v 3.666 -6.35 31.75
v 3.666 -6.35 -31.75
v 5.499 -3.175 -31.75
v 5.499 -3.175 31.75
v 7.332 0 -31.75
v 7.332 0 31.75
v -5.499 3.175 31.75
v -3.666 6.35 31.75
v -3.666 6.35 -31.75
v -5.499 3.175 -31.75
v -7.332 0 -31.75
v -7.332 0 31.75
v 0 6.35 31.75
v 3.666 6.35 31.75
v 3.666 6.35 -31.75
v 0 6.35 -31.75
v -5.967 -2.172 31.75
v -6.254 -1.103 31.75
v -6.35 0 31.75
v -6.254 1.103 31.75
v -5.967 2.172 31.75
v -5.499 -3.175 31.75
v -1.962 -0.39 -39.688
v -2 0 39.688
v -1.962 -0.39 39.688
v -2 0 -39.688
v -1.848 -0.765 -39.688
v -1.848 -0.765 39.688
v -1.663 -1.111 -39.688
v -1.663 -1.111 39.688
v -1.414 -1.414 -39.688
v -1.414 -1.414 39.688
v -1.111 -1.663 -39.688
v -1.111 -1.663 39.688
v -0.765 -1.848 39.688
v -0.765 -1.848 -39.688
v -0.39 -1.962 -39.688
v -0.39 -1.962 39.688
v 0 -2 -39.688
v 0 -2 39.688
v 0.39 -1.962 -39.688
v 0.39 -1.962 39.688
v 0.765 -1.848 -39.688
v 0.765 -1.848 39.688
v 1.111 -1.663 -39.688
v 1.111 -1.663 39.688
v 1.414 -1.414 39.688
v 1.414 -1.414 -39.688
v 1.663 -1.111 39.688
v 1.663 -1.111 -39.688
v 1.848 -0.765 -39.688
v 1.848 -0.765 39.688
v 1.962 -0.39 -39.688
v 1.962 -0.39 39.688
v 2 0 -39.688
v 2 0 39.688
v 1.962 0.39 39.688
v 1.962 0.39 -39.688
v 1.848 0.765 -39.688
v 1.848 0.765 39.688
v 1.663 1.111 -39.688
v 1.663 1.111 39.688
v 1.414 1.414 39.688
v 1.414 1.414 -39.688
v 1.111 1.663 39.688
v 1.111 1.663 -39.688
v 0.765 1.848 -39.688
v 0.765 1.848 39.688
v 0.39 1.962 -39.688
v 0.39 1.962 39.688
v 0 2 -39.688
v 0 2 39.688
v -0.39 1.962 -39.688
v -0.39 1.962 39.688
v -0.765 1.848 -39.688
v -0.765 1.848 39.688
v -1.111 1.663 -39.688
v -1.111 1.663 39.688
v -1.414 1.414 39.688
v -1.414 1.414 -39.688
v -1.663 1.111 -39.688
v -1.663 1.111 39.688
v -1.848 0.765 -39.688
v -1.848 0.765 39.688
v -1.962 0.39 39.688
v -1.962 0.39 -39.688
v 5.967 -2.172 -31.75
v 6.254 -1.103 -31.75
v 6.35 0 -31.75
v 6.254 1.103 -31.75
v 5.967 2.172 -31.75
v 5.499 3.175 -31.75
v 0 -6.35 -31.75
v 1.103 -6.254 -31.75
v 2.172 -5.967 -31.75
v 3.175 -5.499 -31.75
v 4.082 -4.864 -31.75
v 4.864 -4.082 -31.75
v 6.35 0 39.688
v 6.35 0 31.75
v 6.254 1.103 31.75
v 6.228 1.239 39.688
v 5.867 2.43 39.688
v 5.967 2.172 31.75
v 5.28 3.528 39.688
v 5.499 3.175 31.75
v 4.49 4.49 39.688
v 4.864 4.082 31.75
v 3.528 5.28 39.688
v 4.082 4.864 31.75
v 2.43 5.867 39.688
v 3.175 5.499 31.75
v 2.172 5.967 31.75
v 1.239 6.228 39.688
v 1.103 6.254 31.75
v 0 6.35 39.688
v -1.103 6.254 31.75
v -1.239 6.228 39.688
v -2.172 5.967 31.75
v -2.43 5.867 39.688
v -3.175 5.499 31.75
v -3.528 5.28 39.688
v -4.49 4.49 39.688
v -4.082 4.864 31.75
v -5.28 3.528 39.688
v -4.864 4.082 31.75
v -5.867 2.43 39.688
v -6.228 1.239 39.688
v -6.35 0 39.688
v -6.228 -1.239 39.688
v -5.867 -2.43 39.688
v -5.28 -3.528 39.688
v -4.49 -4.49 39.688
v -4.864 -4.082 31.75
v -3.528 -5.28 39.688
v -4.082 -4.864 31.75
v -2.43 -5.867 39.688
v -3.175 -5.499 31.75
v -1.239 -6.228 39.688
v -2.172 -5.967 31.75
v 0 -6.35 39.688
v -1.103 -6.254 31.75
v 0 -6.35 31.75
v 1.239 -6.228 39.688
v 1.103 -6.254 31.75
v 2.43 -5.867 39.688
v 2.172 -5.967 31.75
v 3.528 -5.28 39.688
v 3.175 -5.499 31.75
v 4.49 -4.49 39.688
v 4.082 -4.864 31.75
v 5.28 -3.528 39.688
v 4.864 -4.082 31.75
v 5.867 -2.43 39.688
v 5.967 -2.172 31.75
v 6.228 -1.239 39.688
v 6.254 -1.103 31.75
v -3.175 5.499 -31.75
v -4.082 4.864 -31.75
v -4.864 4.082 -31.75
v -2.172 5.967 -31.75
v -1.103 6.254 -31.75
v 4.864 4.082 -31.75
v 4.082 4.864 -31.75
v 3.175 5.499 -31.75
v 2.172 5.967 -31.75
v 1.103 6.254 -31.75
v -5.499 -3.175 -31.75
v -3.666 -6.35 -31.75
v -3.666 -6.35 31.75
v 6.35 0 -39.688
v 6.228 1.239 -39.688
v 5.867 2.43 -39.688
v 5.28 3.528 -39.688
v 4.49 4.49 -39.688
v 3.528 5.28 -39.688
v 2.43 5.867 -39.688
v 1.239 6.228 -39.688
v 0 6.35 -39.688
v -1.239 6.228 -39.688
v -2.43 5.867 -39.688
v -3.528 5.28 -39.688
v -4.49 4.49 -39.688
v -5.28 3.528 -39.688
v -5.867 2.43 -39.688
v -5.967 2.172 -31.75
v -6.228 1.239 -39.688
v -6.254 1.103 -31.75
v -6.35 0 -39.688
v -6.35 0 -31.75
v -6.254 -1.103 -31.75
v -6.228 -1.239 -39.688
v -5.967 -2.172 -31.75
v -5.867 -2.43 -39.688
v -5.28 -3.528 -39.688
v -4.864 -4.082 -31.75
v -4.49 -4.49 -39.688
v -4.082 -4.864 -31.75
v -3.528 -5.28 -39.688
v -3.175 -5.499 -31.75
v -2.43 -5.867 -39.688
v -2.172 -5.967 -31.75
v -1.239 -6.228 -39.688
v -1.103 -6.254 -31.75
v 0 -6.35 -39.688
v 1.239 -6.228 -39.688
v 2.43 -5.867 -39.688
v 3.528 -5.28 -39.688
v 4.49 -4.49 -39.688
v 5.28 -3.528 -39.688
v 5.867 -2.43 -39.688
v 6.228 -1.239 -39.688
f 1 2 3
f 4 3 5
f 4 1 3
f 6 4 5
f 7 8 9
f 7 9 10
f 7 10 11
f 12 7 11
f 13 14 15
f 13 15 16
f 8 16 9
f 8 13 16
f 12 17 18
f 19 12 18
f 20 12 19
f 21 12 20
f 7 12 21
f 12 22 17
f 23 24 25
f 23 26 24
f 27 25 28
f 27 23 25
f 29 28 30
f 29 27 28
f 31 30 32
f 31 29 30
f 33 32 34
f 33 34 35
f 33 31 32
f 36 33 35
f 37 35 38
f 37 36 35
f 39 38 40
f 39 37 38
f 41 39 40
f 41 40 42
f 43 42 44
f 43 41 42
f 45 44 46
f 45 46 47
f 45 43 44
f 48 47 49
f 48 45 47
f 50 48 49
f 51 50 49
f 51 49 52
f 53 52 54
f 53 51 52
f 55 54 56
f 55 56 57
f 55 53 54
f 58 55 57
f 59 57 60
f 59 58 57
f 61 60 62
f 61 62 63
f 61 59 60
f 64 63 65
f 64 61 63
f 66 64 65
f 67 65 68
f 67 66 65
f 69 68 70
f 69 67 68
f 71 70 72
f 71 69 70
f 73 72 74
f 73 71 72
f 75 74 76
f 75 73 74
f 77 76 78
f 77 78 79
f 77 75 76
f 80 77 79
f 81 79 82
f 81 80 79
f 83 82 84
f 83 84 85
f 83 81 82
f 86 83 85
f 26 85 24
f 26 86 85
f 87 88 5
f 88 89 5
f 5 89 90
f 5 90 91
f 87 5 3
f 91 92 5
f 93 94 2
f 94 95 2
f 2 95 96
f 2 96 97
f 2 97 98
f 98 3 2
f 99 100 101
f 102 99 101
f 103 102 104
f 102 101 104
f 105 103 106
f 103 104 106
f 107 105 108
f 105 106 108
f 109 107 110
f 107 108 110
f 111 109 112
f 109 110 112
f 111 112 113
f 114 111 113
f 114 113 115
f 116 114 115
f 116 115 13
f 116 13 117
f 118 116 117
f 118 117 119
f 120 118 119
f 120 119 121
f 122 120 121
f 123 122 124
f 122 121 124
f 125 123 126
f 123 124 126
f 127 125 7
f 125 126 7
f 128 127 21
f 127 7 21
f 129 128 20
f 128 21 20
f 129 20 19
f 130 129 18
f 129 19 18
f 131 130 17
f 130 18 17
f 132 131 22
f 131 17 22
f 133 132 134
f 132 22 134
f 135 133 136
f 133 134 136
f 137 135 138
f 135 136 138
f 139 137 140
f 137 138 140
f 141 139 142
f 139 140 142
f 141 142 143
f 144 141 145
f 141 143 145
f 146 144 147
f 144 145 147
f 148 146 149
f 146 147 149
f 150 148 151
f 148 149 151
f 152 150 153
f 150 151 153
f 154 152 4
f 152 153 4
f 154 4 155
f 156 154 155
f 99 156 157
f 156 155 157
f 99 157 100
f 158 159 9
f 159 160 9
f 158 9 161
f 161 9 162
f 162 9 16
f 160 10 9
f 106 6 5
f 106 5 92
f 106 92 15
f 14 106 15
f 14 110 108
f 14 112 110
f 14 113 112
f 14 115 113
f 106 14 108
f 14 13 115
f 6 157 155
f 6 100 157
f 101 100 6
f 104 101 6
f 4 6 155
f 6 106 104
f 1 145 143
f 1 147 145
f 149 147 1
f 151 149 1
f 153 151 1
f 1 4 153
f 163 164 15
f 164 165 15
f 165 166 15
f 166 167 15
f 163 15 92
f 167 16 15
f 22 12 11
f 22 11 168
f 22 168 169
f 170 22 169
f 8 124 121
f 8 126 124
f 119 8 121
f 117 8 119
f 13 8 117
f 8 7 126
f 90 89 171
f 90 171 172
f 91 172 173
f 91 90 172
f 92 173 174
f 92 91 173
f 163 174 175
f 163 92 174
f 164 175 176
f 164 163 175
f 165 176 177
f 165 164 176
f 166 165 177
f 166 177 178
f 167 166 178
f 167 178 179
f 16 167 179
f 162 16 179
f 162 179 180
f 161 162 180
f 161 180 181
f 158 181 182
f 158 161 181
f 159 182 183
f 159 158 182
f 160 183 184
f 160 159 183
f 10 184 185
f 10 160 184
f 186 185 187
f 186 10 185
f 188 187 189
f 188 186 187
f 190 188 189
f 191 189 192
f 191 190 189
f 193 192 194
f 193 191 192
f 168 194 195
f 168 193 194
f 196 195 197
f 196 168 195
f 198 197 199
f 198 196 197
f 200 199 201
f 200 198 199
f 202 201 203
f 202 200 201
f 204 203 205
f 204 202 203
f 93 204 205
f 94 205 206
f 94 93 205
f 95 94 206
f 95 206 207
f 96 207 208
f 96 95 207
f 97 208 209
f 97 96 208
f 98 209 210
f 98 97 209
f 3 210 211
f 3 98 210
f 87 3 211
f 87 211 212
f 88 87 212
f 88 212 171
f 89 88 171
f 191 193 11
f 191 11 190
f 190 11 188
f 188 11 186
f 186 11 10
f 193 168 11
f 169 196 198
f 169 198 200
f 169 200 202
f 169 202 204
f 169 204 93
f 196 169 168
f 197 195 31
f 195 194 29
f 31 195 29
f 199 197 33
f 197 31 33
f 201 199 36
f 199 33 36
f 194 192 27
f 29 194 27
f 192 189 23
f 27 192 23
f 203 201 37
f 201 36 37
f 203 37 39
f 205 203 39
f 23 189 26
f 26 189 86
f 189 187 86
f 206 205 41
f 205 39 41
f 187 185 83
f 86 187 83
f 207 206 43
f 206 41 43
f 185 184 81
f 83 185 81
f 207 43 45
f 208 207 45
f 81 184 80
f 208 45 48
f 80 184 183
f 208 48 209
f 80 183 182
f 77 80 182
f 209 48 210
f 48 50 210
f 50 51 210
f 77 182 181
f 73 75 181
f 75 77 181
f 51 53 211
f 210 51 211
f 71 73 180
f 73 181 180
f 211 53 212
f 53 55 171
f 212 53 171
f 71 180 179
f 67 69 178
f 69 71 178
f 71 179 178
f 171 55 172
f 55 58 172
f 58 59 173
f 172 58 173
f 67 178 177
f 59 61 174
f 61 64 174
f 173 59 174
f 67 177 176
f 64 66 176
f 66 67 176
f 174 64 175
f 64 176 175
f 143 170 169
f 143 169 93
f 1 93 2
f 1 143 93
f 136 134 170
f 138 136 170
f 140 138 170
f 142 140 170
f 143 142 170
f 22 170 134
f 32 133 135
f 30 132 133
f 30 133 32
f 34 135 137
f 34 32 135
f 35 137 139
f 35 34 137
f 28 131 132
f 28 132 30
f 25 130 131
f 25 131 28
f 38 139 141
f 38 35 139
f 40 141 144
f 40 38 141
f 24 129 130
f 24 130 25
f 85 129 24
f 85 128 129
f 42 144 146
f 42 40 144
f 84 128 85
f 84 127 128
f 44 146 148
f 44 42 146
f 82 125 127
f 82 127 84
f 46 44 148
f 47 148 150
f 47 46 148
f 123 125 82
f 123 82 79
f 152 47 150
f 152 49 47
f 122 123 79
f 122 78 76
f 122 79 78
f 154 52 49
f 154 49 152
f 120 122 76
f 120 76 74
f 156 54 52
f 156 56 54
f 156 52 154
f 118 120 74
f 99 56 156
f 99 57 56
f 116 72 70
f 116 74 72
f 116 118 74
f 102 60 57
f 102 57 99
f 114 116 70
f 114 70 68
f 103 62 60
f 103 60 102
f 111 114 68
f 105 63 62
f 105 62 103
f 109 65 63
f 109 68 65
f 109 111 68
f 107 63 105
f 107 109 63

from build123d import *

# Parameters (mm, degrees)
SKETCH1_R               = 2.000000064
BOSS_EXTRUDE1_DEPTH     = 39.6875
SKETCH2_R               = 8.89
SKETCH2_R_2             = 6.35
CUT_EXTRUDE_THIN1_DEPTH = 7.9375


with BuildPart() as part:
    # Sketch1 → Boss-Extrude1 (new, symmetric)
    with BuildSketch(Plane.XY):
        Polygon((7.332348419, 0), (3.666174209, 6.35), (-3.666174209, 6.35), (-7.332348419, 0), (-3.666174209, -6.35), (3.666174209, -6.35), align=None)
        with Locations(Location((0, 0, 0), (0, 0, 180))):
            Circle(SKETCH1_R, mode=Mode.SUBTRACT)
    extrude(amount=BOSS_EXTRUDE1_DEPTH, both=True)

    # Sketch2 → Cut-Extrude-Thin1 (cut)
    with BuildSketch(Plane.XY.offset(31.75)):
        Circle(SKETCH2_R)
        Circle(SKETCH2_R_2, mode=Mode.SUBTRACT)
    cut_extrude_thin1 = extrude(amount=CUT_EXTRUDE_THIN1_DEPTH, mode=Mode.SUBTRACT)

    # Mirror1: Cut-Extrude-Thin1 across plane
    add(cut_extrude_thin1.mirror(Plane.XY), mode=Mode.SUBTRACT)


solid = part.part
